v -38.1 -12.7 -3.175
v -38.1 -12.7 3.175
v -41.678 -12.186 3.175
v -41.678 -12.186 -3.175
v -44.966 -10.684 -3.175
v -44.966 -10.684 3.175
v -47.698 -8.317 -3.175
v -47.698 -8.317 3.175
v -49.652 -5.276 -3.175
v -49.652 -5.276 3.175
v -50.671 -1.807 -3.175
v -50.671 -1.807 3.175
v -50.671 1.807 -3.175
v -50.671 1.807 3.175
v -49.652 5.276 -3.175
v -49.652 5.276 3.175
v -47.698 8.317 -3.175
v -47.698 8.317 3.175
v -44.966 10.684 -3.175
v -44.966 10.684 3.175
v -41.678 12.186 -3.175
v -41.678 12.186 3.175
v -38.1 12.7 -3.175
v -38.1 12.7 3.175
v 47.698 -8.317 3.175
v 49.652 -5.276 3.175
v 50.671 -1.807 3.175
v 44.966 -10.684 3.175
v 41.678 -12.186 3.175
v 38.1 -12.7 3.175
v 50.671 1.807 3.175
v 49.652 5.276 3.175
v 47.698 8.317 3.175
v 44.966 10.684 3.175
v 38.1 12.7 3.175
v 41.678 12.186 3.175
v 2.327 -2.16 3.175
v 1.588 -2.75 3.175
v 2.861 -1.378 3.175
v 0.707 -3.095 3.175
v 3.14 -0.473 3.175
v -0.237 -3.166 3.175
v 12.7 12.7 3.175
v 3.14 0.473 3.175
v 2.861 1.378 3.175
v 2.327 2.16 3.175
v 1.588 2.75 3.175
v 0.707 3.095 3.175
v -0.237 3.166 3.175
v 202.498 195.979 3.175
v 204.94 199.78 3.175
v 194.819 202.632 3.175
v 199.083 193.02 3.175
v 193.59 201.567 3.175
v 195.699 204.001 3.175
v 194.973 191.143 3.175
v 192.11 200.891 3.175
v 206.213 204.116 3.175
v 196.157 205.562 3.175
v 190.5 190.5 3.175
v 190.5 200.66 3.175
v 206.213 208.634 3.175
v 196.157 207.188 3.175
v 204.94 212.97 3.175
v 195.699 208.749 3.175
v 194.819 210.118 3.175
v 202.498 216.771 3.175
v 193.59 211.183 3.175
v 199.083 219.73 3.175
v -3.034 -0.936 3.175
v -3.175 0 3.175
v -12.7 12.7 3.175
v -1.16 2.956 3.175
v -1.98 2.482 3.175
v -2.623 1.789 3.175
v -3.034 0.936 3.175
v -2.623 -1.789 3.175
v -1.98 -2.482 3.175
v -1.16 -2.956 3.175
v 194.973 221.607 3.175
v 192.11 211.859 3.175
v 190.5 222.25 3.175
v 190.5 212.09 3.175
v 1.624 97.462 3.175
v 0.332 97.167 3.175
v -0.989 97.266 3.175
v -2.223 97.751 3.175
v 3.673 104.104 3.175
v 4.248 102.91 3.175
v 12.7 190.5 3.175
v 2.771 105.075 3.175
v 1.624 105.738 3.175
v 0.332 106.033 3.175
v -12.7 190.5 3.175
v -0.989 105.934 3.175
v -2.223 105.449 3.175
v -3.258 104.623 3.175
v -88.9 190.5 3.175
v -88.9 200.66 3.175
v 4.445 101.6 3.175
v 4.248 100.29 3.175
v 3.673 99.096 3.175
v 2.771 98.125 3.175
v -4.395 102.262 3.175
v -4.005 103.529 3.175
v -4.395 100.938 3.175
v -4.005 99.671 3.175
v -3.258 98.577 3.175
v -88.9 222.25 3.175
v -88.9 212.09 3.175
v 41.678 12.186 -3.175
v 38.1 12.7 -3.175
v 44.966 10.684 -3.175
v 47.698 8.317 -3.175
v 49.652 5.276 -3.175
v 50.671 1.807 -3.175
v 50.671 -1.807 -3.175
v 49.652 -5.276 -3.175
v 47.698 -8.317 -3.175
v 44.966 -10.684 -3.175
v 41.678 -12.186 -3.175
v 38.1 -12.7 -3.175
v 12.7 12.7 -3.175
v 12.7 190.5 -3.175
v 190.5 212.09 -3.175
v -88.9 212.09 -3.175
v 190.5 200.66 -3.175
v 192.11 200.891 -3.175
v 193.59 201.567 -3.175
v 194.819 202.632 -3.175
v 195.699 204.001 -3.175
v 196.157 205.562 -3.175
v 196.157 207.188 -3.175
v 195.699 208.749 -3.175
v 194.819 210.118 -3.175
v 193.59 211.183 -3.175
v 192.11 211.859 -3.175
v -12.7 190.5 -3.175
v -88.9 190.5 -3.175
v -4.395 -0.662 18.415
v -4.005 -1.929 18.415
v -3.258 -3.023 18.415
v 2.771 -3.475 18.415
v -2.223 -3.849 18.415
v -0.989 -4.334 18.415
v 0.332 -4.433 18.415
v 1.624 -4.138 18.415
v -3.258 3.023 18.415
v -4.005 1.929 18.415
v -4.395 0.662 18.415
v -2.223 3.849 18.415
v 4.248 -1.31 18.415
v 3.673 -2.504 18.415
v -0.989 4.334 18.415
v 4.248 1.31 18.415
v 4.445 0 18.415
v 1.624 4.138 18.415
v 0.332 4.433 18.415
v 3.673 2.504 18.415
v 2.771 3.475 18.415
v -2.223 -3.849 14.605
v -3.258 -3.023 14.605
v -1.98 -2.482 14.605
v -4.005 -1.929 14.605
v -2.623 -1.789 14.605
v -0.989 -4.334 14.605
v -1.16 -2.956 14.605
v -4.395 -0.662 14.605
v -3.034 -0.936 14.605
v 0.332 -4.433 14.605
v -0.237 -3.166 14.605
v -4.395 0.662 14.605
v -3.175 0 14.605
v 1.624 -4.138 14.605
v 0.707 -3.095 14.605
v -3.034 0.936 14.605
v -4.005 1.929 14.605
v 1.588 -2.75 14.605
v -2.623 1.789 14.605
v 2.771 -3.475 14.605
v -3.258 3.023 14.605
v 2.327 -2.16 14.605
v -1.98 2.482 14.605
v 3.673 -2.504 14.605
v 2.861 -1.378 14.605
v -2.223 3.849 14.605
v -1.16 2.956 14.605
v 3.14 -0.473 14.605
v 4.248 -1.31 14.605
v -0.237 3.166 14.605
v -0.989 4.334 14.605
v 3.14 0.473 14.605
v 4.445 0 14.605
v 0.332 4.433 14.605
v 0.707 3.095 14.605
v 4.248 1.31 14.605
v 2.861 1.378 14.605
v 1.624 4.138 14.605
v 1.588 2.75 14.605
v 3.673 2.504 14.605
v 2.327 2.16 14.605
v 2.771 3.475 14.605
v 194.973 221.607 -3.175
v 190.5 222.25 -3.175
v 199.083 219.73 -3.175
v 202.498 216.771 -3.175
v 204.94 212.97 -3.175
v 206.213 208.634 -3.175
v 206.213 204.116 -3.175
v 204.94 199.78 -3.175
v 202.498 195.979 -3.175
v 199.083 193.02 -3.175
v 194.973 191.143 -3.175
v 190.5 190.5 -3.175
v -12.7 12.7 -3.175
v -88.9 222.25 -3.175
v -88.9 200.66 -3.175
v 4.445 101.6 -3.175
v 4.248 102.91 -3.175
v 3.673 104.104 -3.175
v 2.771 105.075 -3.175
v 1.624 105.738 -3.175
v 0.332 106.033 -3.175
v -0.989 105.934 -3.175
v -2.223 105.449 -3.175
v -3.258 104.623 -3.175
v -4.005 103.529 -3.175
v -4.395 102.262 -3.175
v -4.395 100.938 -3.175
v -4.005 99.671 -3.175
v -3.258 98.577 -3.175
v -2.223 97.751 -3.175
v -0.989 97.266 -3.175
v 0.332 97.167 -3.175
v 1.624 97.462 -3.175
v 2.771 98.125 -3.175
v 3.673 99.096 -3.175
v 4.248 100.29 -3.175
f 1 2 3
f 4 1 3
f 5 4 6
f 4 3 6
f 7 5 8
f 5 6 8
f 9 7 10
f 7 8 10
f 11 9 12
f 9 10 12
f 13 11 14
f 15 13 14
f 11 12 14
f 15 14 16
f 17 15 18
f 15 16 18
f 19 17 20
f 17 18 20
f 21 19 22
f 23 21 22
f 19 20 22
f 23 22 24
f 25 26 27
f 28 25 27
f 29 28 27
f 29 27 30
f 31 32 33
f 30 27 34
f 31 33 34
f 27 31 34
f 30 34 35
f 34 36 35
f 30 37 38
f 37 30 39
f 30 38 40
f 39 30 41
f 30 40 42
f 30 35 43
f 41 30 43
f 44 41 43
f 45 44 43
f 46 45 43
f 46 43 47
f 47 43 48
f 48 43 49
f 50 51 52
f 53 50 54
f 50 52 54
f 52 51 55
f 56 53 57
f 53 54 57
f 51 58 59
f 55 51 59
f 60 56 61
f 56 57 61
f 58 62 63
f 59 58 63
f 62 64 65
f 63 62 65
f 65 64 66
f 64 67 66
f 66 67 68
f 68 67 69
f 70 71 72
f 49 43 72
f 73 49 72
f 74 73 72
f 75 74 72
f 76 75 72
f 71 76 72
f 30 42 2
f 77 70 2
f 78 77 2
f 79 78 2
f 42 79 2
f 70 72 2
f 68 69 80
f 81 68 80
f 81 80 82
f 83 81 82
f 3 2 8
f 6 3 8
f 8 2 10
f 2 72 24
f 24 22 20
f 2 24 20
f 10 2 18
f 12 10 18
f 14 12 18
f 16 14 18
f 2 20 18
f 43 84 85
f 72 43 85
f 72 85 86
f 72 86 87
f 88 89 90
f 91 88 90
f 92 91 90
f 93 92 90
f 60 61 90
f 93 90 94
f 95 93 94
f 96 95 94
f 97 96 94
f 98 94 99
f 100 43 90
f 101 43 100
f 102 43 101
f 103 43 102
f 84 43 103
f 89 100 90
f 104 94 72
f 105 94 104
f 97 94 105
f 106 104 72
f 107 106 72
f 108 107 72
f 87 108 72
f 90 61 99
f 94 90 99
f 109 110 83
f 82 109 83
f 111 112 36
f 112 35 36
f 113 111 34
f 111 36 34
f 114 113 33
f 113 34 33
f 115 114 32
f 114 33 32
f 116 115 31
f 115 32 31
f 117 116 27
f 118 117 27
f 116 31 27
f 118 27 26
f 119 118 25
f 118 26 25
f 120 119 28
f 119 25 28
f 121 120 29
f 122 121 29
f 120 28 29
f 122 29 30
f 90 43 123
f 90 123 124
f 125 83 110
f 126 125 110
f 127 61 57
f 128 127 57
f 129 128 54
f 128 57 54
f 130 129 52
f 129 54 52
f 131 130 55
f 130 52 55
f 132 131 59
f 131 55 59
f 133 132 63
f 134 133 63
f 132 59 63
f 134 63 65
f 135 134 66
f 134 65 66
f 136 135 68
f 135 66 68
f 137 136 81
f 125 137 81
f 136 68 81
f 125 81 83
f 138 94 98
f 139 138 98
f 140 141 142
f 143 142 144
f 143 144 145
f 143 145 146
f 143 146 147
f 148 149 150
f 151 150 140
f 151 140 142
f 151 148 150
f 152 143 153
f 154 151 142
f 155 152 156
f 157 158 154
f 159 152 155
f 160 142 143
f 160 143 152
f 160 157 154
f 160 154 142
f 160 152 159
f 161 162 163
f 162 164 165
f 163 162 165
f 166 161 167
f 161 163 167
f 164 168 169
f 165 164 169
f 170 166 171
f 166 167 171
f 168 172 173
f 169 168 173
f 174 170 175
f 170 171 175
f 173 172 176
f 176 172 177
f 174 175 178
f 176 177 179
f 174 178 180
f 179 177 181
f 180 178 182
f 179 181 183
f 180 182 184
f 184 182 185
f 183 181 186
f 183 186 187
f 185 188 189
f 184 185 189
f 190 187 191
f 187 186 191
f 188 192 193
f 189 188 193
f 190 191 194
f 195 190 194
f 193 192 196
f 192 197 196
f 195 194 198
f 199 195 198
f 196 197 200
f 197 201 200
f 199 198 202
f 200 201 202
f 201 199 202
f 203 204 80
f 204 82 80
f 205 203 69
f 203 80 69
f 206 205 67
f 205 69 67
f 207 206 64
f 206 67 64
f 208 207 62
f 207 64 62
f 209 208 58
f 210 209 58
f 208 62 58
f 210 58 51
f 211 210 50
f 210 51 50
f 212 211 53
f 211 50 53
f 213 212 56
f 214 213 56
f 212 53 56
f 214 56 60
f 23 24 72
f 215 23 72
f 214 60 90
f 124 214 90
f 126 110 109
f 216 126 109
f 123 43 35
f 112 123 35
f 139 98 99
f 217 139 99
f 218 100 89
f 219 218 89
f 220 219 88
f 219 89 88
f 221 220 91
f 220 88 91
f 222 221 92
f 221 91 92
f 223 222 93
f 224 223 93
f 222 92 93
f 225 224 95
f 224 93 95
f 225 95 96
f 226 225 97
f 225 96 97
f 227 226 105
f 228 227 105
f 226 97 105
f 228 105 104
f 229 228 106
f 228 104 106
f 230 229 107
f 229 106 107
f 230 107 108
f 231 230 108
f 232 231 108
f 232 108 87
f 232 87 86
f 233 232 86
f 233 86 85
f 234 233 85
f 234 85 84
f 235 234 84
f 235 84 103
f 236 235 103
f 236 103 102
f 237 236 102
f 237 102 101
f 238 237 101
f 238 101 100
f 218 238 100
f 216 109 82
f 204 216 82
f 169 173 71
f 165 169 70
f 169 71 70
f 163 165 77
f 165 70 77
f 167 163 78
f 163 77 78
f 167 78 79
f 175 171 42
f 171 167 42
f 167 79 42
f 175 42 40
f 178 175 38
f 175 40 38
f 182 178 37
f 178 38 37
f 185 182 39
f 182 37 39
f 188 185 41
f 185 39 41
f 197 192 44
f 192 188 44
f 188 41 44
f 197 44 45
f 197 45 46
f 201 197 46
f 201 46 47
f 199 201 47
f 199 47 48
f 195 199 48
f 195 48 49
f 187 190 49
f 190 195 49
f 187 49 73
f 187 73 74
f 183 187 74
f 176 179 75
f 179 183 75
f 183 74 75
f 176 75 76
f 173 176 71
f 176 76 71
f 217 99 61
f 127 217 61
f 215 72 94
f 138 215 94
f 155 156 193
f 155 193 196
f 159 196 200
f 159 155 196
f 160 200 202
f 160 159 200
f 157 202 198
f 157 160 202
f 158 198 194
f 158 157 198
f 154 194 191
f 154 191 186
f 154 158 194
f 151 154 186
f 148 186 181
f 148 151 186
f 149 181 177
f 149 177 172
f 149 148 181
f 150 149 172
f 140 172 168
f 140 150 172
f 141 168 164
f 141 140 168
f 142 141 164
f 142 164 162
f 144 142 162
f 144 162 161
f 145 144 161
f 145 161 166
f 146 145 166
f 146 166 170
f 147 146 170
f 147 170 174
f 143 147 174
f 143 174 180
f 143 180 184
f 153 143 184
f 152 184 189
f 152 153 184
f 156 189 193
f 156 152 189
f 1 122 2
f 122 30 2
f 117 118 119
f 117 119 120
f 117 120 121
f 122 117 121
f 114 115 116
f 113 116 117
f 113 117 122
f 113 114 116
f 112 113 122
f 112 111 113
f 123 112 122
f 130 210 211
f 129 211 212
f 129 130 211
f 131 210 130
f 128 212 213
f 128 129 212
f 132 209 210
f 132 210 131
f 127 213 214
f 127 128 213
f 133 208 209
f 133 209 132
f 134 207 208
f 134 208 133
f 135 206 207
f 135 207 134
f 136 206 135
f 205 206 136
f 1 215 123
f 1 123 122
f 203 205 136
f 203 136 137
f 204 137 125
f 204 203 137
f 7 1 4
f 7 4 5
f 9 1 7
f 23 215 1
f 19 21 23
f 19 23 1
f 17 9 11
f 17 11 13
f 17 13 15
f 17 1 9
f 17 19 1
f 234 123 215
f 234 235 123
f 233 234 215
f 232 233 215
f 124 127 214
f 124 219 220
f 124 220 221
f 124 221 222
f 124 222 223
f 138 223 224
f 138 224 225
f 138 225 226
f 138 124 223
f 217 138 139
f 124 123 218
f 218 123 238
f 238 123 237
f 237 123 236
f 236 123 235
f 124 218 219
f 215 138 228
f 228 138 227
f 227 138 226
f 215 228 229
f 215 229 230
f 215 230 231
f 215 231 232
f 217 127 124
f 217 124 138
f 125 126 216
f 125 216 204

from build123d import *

# Parameters (mm, degrees)
BOSS_EXTRUDE1_DEPTH = 3.175
SKETCH4_W           = 25.4
SKETCH4_H           = 177.8
BOSS_EXTRUDE2_DEPTH = 3.175
BOSS_EXTRUDE3_DEPTH = 3.175
CUT_EXTRUDE1_DEPTH  = 304.357916701
SKETCH7_R           = 4.445
CUT_EXTRUDE2_DEPTH  = 304.357916701
SKETCH9_R           = 3.175
BOSS_EXTRUDE6_DEPTH = 15.24
SKETCH10_R          = 4.445
BOSS_EXTRUDE7_DEPTH = 3.81


with BuildPart() as part:
    # Sketch3 → Boss-Extrude1 (new, symmetric)
    with BuildSketch(Plane.XY):
        with BuildLine():
            Line((-38.1, 12.7), (38.1, 12.7))
            ThreePointArc((38.1, 12.7), (50.8, 0), (38.1, -12.7))
            Line((38.1, -12.7), (-38.1, -12.7))
            ThreePointArc((-38.1, -12.7), (-50.8, 0), (-38.1, 12.7))
        make_face()
    extrude(amount=BOSS_EXTRUDE1_DEPTH, both=True)

    # Sketch4 → Boss-Extrude2 (add, symmetric)
    with BuildSketch(Plane.XY):
        with Locations((0, 101.6)):
            Rectangle(SKETCH4_W, SKETCH4_H)
    extrude(amount=BOSS_EXTRUDE2_DEPTH, both=True)

    # Sketch5 → Boss-Extrude3 (add, symmetric)
    with BuildSketch(Plane.XY):
        with BuildLine():
            Line((-88.9, 222.25), (190.5, 222.25))
            ThreePointArc((190.5, 222.25), (206.375, 206.375), (190.5, 190.5))
            Line((190.5, 190.5), (-88.9, 190.5))
            Line((-88.9, 190.5), (-88.9, 222.25))
        make_face()
    extrude(amount=BOSS_EXTRUDE3_DEPTH, both=True)

    # Sketch6 → Cut-Extrude1 (cut, through all)
    with BuildSketch(Plane.XY.offset(3.175)):
        with BuildLine():
            Line((-88.9, 212.09), (-88.9, 200.66))
            Line((-88.9, 200.66), (190.5, 200.66))
            ThreePointArc((190.5, 200.66), (196.215, 206.375), (190.5, 212.09))
            Line((190.5, 212.09), (-88.9, 212.09))
        make_face()
    extrude(amount=-CUT_EXTRUDE1_DEPTH, mode=Mode.SUBTRACT)

    # Sketch7 → Cut-Extrude2 (cut, through all)
    with BuildSketch(Plane.XY.offset(3.175)):
        with Locations((0, 101.6)):
            Circle(SKETCH7_R)
    extrude(amount=-CUT_EXTRUDE2_DEPTH, mode=Mode.SUBTRACT)

    # Sketch9 → Boss-Extrude6 (add)
    with BuildSketch(Plane.XY.offset(3.175)):
        with Locations(Location((0, 0, 0), (0, 0, 180))):
            Circle(SKETCH9_R)
    extrude(amount=BOSS_EXTRUDE6_DEPTH)

    # Sketch10 → Boss-Extrude7 (add)
    with BuildSketch(Plane.XY.offset(18.415)):
        Circle(SKETCH10_R)
    extrude(amount=-BOSS_EXTRUDE7_DEPTH)


solid = part.part
